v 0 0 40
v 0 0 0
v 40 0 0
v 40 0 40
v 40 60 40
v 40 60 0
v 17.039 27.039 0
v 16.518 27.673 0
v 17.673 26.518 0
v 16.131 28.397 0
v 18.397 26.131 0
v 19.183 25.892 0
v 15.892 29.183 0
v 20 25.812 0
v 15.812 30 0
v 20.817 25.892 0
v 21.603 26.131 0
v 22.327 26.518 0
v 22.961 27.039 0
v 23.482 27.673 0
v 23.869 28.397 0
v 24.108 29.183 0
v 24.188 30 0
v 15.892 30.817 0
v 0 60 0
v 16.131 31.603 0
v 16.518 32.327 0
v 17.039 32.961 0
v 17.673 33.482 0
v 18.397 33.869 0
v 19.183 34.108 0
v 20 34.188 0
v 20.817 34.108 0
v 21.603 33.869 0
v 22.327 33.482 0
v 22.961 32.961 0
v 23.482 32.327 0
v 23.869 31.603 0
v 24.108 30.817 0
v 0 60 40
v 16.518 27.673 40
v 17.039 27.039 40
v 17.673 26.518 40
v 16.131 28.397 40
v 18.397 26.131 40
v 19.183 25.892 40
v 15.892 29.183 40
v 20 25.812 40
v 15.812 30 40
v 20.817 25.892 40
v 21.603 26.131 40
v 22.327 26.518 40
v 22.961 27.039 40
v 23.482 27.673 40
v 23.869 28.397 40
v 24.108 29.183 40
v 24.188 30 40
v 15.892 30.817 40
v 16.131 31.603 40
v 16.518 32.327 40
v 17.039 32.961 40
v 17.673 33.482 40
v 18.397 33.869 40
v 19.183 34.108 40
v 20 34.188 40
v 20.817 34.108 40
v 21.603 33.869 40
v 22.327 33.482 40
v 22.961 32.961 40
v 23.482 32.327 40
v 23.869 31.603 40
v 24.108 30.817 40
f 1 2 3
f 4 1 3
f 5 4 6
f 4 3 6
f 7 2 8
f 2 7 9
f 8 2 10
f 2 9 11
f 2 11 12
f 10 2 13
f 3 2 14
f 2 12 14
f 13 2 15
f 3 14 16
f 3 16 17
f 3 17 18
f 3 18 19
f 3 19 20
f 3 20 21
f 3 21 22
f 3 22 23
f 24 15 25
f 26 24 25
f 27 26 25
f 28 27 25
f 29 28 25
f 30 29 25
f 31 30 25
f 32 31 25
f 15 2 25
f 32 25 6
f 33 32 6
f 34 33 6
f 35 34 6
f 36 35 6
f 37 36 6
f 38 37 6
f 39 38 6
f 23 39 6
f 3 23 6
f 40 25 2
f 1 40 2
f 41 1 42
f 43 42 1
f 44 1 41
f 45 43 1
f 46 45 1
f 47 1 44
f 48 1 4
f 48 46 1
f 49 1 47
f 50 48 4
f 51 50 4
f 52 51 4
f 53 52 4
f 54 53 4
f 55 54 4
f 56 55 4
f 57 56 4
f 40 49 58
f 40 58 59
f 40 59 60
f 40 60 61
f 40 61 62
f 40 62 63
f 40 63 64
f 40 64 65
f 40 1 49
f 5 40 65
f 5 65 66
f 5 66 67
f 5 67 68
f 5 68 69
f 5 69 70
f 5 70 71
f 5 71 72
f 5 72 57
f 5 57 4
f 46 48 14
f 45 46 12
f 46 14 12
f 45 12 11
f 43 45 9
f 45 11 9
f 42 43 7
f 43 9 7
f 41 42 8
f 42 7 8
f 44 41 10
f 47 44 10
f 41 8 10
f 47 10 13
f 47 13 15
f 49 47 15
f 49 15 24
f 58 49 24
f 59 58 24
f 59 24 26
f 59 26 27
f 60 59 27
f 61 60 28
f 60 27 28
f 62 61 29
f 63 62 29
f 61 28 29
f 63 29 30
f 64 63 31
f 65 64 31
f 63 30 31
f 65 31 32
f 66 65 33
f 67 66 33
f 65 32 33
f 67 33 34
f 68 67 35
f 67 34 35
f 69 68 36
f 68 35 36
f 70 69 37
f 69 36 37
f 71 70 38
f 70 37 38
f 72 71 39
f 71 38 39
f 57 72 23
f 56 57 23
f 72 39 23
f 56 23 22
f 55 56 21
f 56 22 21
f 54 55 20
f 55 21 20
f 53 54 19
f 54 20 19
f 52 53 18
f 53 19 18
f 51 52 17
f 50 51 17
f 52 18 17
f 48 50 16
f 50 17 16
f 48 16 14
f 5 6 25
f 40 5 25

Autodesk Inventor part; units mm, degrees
ref_plane "YZ Plane" through (0, 0, 0) normal (1, 0, 0) x (0, 1, 0)
ref_plane "XZ Plane" through (0, 0, 0) normal (0, 1, 0) x (-1, 0, 0)
ref_plane "XY Plane" through (0, 0, 0) normal (0, 0, 1) x (1, 0, 0)
sketch "Sketch1" plane through (0, 0, 0) normal (0, 0, 1) x (1, 0, 0)
  line L0 (0, 0) -> (40, 0)
  line L1 (40, 0) -> (40, 60)
  line L2 (40, 60) -> (0, 60)
  line L3 (0, 60) -> (0, 0)
  dimension "d0" = 40
  dimension "d1" = 60
extrude "Extrusion1" add sketch "Sketch1" along normal blind 40
sketch "Sketch2" plane through (0, 0, 40) normal (0, 0, 1) x (1, 0, 0)
  circle A0 centre (20, 30) radius 6
  line L0 (0, 0) -> (40, 0) projected
  line L1 (40, 0) -> (40, 60) projected
  point P0 (20, 0)
  dimension "d4" = 12
  dimension "d12" = 30
  dimension "d13" = 20
hole "Hole1" at (20, 30, 40) direction (0, 0, -1) diameter 8.376 end through all thread size "M10x1.5" class "6H" standard "ISO Metric profile"
properties part number "Aluminium block"
